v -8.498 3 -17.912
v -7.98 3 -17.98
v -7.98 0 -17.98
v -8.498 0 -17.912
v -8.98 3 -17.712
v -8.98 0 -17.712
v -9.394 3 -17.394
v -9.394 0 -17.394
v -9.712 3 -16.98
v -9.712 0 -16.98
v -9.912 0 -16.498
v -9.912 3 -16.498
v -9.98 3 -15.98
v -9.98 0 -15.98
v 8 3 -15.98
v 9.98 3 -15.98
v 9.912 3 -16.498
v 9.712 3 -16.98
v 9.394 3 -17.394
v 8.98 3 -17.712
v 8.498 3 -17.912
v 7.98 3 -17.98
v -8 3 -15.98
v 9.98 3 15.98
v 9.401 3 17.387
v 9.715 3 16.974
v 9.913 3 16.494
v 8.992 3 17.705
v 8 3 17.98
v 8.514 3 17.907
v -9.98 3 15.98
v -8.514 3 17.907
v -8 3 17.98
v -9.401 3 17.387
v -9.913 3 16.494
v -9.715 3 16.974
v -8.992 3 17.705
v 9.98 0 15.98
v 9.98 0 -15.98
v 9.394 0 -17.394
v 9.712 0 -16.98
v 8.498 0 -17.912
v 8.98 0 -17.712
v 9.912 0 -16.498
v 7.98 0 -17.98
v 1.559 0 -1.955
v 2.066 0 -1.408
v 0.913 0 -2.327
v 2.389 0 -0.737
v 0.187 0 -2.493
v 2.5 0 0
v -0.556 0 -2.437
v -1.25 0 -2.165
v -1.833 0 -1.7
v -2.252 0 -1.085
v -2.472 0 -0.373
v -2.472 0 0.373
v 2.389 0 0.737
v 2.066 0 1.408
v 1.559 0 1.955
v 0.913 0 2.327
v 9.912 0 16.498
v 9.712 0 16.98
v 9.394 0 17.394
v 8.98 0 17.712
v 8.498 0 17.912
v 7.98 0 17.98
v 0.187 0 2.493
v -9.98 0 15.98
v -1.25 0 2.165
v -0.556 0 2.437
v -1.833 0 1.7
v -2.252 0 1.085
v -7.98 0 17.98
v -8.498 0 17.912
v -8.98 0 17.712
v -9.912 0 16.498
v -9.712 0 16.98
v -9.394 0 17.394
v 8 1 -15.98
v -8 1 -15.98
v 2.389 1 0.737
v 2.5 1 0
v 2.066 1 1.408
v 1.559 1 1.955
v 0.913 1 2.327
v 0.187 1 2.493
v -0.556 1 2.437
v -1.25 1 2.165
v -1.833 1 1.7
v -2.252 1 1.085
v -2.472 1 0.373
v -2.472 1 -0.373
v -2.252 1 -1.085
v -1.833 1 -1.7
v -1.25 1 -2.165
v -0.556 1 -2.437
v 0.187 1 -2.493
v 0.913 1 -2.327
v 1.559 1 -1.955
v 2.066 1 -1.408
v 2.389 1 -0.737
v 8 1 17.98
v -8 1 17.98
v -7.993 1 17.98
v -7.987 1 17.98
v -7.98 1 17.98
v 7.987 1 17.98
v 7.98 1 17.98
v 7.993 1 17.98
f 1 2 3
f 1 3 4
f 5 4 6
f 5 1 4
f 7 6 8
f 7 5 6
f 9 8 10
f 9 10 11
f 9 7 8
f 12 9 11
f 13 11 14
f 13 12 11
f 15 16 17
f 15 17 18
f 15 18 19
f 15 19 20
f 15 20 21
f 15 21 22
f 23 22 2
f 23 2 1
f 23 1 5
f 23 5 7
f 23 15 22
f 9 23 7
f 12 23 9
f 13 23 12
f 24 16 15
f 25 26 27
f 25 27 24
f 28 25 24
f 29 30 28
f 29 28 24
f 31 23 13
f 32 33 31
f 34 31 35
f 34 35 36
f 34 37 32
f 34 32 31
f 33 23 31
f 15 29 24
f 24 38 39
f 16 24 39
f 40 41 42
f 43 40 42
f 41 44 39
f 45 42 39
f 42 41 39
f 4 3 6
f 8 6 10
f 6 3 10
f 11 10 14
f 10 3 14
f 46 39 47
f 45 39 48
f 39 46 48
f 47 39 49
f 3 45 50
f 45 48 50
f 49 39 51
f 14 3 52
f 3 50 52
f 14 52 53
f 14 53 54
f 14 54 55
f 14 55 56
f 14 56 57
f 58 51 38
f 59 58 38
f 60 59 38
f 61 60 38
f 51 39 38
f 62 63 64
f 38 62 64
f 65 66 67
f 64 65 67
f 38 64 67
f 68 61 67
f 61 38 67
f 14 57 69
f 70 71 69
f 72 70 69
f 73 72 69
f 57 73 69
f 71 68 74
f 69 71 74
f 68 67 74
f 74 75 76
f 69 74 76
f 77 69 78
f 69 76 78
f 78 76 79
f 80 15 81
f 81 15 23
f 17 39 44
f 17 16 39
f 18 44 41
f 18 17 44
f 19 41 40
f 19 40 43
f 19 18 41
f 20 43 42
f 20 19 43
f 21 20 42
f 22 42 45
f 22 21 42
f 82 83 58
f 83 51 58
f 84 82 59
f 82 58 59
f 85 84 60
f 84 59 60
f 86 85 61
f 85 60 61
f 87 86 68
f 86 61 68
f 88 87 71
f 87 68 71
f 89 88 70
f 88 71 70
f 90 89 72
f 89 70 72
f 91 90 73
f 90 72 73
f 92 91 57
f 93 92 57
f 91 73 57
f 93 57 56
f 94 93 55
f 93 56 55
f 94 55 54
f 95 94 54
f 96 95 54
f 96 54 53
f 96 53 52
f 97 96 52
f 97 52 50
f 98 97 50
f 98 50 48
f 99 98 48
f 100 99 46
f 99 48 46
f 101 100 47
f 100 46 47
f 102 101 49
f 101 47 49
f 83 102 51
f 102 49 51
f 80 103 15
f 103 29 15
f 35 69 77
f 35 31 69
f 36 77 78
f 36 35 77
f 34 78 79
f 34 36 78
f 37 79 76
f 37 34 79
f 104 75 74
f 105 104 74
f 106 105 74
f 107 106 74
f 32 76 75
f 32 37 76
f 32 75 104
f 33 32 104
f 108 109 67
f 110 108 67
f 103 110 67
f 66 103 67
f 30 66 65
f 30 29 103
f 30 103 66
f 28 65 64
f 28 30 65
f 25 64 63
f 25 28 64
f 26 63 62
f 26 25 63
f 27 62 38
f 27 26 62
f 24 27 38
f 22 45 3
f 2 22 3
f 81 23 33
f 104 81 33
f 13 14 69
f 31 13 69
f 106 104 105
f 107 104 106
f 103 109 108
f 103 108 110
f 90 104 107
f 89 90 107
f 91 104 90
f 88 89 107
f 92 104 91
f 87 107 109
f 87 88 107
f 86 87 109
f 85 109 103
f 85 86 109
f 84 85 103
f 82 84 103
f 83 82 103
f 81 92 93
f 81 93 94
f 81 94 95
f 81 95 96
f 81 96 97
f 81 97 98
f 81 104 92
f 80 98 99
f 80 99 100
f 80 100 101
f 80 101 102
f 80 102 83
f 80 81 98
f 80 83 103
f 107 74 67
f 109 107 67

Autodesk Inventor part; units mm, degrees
ref_plane "YZ Plane" through (0, 0, 0) normal (1, 0, 0) x (0, 1, 0)
ref_plane "XZ Plane" through (0, 0, 0) normal (0, 1, 0) x (-1, 0, 0)
ref_plane "XY Plane" through (0, 0, 0) normal (0, 0, 1) x (1, 0, 0)
sketch "Sketch1" plane through (0, 0, 0) normal (0, 1, 0) x (-1, 0, 0)
  line L0 (9.98, 17.98) -> (-9.98, 17.98)
  line L1 (-9.98, 17.98) -> (-9.98, -17.98)
  line L2 (-9.98, -17.98) -> (9.98, -17.98)
  line L3 (9.98, -17.98) -> (9.98, 17.98)
  line L4 (9.98, 17.98) -> (-9.98, -17.98) construction
  line L5 (-9.98, 17.98) -> (9.98, -17.98) construction
  point P0 (0, 0)
  dimension "d0" = 33.96
  dimension "d1" = 19.96
extrude "arm-wall" add sketch "Sketch1" along normal blind 3
sketch "Sketch2" plane through (0, 3, 0) normal (0, 1, 0) x (1, 0, 0)
  line L0 (-8, -17.98) -> (8, -17.98)
  line L1 (8, -17.98) -> (8, 15.98)
  line L2 (8, 15.98) -> (-8, 15.98)
  line L3 (-8, 15.98) -> (-8, -17.98)
  line L4 (-8, -17.98) -> (8, 15.98) construction
  line L5 (8, -17.98) -> (-8, 15.98) construction
  line L6 (0, 25.172) -> (0, -25.172) projected
  line L7 (9.98, 17.98) -> (-9.98, 17.98) projected
  line L8 (-9.98, -17.98) -> (9.98, -17.98) projected
  point P0 (0, 0)
  point P1 (0, -1)
  point P2 (0, -1)
  dimension "d4" = 16
  dimension "d5" = 1
extrude "slot" cut sketch "Sketch2" against normal blind 2
fillet "Fillet1" radius 2 1 edges at (-9.98, 1.5, 17.98)
fillet "Fillet2" radius 2 1 edges at (9.98, 1.5, 17.98)
fillet "Fillet3" radius 2 1 edges at (9.98, 1.5, -17.98)
fillet "Fillet4" radius 2 1 edges at (-9.98, 1.5, -17.98)
sketch "Sketch3" plane through (0, 0, 0) normal (0, -1, 0) x (1, 0, 0)
  circle A0 centre (0, 0) radius 2.5
  dimension "d12" = 5
extrude "Extrusion3" cut sketch "Sketch3" against normal up to next
equation "\"d2\" = armthick"
equation "\"d4\" = adapterh"
equation "\"d5\" = -0.5 * adapterw + 0.5 * armw"
equation "\"d6\" = armslotd"
equation "\"d8\" = cornerrad"
equation "\"d9\" = cornerrad"
equation "\"d10\" = cornerrad"
equation "\"d11\" = cornerrad"
equation "\"printer3dtolerance\" = 0.1"
equation "\"wallw\" = 42"
equation "\"wallh\" = 44"
equation "\"cornerrad\" = 2"
equation "\"baseextra\" = 2"
equation "\"wall1_thick\" = 8"
equation "\"wall2_thick\" = 6.4"
equation "\"wall3_thick\" = 4"
equation "\"wall1slot\" = 8.1"
equation "\"wall2slot\" = 6.5"
equation "\"wall3slot\" = 4.1"
equation "\"gap2\" = 28"
equation "\"baseh\" = 79"
equation "\"basew\" = 44"
equation "\"base_thick\" = 6"
equation "\"base_slots_depth\" = 4"
equation "\"servobigcircledia\" = 11.6"
equation "\"servosmallcircledia\" = 5.9"
equation "\"servo9gw\" = 22.8"
equation "\"servomounth\" = 4"
equation "\"servomountsquare\" = 4"
equation "\"servopolygonr\" = 6.1"
equation "\"servopolygonl\" = 5.9"
equation "\"distancefrombottom\" = 34"
equation "\"distancefromleft\" = 22"
equation "\"wall3slotd\" = 2"
equation "\"wall3slotw\" = 36"
equation "\"adapterh\" = 16"
equation "\"adapterw\" = 32"
equation "\"armw\" = 34"
equation "\"armslotd\" = 2"
equation "\"armthick\" = 3"
equation "\"fanhb\" = 11"
equation "\"fanhs\" = 9.6"
equation "\"adapterwallslotd\" = 2"
equation "\"adapterwallthick\" = 6"
equation "\"hornscrewholed\" = 2"
equation "\"hornthick\" = 1.5"
equation "\"armhornthick\" = 3"
equation "\"hornscrewheadd\" = 3"
properties part number "slot-wall"
